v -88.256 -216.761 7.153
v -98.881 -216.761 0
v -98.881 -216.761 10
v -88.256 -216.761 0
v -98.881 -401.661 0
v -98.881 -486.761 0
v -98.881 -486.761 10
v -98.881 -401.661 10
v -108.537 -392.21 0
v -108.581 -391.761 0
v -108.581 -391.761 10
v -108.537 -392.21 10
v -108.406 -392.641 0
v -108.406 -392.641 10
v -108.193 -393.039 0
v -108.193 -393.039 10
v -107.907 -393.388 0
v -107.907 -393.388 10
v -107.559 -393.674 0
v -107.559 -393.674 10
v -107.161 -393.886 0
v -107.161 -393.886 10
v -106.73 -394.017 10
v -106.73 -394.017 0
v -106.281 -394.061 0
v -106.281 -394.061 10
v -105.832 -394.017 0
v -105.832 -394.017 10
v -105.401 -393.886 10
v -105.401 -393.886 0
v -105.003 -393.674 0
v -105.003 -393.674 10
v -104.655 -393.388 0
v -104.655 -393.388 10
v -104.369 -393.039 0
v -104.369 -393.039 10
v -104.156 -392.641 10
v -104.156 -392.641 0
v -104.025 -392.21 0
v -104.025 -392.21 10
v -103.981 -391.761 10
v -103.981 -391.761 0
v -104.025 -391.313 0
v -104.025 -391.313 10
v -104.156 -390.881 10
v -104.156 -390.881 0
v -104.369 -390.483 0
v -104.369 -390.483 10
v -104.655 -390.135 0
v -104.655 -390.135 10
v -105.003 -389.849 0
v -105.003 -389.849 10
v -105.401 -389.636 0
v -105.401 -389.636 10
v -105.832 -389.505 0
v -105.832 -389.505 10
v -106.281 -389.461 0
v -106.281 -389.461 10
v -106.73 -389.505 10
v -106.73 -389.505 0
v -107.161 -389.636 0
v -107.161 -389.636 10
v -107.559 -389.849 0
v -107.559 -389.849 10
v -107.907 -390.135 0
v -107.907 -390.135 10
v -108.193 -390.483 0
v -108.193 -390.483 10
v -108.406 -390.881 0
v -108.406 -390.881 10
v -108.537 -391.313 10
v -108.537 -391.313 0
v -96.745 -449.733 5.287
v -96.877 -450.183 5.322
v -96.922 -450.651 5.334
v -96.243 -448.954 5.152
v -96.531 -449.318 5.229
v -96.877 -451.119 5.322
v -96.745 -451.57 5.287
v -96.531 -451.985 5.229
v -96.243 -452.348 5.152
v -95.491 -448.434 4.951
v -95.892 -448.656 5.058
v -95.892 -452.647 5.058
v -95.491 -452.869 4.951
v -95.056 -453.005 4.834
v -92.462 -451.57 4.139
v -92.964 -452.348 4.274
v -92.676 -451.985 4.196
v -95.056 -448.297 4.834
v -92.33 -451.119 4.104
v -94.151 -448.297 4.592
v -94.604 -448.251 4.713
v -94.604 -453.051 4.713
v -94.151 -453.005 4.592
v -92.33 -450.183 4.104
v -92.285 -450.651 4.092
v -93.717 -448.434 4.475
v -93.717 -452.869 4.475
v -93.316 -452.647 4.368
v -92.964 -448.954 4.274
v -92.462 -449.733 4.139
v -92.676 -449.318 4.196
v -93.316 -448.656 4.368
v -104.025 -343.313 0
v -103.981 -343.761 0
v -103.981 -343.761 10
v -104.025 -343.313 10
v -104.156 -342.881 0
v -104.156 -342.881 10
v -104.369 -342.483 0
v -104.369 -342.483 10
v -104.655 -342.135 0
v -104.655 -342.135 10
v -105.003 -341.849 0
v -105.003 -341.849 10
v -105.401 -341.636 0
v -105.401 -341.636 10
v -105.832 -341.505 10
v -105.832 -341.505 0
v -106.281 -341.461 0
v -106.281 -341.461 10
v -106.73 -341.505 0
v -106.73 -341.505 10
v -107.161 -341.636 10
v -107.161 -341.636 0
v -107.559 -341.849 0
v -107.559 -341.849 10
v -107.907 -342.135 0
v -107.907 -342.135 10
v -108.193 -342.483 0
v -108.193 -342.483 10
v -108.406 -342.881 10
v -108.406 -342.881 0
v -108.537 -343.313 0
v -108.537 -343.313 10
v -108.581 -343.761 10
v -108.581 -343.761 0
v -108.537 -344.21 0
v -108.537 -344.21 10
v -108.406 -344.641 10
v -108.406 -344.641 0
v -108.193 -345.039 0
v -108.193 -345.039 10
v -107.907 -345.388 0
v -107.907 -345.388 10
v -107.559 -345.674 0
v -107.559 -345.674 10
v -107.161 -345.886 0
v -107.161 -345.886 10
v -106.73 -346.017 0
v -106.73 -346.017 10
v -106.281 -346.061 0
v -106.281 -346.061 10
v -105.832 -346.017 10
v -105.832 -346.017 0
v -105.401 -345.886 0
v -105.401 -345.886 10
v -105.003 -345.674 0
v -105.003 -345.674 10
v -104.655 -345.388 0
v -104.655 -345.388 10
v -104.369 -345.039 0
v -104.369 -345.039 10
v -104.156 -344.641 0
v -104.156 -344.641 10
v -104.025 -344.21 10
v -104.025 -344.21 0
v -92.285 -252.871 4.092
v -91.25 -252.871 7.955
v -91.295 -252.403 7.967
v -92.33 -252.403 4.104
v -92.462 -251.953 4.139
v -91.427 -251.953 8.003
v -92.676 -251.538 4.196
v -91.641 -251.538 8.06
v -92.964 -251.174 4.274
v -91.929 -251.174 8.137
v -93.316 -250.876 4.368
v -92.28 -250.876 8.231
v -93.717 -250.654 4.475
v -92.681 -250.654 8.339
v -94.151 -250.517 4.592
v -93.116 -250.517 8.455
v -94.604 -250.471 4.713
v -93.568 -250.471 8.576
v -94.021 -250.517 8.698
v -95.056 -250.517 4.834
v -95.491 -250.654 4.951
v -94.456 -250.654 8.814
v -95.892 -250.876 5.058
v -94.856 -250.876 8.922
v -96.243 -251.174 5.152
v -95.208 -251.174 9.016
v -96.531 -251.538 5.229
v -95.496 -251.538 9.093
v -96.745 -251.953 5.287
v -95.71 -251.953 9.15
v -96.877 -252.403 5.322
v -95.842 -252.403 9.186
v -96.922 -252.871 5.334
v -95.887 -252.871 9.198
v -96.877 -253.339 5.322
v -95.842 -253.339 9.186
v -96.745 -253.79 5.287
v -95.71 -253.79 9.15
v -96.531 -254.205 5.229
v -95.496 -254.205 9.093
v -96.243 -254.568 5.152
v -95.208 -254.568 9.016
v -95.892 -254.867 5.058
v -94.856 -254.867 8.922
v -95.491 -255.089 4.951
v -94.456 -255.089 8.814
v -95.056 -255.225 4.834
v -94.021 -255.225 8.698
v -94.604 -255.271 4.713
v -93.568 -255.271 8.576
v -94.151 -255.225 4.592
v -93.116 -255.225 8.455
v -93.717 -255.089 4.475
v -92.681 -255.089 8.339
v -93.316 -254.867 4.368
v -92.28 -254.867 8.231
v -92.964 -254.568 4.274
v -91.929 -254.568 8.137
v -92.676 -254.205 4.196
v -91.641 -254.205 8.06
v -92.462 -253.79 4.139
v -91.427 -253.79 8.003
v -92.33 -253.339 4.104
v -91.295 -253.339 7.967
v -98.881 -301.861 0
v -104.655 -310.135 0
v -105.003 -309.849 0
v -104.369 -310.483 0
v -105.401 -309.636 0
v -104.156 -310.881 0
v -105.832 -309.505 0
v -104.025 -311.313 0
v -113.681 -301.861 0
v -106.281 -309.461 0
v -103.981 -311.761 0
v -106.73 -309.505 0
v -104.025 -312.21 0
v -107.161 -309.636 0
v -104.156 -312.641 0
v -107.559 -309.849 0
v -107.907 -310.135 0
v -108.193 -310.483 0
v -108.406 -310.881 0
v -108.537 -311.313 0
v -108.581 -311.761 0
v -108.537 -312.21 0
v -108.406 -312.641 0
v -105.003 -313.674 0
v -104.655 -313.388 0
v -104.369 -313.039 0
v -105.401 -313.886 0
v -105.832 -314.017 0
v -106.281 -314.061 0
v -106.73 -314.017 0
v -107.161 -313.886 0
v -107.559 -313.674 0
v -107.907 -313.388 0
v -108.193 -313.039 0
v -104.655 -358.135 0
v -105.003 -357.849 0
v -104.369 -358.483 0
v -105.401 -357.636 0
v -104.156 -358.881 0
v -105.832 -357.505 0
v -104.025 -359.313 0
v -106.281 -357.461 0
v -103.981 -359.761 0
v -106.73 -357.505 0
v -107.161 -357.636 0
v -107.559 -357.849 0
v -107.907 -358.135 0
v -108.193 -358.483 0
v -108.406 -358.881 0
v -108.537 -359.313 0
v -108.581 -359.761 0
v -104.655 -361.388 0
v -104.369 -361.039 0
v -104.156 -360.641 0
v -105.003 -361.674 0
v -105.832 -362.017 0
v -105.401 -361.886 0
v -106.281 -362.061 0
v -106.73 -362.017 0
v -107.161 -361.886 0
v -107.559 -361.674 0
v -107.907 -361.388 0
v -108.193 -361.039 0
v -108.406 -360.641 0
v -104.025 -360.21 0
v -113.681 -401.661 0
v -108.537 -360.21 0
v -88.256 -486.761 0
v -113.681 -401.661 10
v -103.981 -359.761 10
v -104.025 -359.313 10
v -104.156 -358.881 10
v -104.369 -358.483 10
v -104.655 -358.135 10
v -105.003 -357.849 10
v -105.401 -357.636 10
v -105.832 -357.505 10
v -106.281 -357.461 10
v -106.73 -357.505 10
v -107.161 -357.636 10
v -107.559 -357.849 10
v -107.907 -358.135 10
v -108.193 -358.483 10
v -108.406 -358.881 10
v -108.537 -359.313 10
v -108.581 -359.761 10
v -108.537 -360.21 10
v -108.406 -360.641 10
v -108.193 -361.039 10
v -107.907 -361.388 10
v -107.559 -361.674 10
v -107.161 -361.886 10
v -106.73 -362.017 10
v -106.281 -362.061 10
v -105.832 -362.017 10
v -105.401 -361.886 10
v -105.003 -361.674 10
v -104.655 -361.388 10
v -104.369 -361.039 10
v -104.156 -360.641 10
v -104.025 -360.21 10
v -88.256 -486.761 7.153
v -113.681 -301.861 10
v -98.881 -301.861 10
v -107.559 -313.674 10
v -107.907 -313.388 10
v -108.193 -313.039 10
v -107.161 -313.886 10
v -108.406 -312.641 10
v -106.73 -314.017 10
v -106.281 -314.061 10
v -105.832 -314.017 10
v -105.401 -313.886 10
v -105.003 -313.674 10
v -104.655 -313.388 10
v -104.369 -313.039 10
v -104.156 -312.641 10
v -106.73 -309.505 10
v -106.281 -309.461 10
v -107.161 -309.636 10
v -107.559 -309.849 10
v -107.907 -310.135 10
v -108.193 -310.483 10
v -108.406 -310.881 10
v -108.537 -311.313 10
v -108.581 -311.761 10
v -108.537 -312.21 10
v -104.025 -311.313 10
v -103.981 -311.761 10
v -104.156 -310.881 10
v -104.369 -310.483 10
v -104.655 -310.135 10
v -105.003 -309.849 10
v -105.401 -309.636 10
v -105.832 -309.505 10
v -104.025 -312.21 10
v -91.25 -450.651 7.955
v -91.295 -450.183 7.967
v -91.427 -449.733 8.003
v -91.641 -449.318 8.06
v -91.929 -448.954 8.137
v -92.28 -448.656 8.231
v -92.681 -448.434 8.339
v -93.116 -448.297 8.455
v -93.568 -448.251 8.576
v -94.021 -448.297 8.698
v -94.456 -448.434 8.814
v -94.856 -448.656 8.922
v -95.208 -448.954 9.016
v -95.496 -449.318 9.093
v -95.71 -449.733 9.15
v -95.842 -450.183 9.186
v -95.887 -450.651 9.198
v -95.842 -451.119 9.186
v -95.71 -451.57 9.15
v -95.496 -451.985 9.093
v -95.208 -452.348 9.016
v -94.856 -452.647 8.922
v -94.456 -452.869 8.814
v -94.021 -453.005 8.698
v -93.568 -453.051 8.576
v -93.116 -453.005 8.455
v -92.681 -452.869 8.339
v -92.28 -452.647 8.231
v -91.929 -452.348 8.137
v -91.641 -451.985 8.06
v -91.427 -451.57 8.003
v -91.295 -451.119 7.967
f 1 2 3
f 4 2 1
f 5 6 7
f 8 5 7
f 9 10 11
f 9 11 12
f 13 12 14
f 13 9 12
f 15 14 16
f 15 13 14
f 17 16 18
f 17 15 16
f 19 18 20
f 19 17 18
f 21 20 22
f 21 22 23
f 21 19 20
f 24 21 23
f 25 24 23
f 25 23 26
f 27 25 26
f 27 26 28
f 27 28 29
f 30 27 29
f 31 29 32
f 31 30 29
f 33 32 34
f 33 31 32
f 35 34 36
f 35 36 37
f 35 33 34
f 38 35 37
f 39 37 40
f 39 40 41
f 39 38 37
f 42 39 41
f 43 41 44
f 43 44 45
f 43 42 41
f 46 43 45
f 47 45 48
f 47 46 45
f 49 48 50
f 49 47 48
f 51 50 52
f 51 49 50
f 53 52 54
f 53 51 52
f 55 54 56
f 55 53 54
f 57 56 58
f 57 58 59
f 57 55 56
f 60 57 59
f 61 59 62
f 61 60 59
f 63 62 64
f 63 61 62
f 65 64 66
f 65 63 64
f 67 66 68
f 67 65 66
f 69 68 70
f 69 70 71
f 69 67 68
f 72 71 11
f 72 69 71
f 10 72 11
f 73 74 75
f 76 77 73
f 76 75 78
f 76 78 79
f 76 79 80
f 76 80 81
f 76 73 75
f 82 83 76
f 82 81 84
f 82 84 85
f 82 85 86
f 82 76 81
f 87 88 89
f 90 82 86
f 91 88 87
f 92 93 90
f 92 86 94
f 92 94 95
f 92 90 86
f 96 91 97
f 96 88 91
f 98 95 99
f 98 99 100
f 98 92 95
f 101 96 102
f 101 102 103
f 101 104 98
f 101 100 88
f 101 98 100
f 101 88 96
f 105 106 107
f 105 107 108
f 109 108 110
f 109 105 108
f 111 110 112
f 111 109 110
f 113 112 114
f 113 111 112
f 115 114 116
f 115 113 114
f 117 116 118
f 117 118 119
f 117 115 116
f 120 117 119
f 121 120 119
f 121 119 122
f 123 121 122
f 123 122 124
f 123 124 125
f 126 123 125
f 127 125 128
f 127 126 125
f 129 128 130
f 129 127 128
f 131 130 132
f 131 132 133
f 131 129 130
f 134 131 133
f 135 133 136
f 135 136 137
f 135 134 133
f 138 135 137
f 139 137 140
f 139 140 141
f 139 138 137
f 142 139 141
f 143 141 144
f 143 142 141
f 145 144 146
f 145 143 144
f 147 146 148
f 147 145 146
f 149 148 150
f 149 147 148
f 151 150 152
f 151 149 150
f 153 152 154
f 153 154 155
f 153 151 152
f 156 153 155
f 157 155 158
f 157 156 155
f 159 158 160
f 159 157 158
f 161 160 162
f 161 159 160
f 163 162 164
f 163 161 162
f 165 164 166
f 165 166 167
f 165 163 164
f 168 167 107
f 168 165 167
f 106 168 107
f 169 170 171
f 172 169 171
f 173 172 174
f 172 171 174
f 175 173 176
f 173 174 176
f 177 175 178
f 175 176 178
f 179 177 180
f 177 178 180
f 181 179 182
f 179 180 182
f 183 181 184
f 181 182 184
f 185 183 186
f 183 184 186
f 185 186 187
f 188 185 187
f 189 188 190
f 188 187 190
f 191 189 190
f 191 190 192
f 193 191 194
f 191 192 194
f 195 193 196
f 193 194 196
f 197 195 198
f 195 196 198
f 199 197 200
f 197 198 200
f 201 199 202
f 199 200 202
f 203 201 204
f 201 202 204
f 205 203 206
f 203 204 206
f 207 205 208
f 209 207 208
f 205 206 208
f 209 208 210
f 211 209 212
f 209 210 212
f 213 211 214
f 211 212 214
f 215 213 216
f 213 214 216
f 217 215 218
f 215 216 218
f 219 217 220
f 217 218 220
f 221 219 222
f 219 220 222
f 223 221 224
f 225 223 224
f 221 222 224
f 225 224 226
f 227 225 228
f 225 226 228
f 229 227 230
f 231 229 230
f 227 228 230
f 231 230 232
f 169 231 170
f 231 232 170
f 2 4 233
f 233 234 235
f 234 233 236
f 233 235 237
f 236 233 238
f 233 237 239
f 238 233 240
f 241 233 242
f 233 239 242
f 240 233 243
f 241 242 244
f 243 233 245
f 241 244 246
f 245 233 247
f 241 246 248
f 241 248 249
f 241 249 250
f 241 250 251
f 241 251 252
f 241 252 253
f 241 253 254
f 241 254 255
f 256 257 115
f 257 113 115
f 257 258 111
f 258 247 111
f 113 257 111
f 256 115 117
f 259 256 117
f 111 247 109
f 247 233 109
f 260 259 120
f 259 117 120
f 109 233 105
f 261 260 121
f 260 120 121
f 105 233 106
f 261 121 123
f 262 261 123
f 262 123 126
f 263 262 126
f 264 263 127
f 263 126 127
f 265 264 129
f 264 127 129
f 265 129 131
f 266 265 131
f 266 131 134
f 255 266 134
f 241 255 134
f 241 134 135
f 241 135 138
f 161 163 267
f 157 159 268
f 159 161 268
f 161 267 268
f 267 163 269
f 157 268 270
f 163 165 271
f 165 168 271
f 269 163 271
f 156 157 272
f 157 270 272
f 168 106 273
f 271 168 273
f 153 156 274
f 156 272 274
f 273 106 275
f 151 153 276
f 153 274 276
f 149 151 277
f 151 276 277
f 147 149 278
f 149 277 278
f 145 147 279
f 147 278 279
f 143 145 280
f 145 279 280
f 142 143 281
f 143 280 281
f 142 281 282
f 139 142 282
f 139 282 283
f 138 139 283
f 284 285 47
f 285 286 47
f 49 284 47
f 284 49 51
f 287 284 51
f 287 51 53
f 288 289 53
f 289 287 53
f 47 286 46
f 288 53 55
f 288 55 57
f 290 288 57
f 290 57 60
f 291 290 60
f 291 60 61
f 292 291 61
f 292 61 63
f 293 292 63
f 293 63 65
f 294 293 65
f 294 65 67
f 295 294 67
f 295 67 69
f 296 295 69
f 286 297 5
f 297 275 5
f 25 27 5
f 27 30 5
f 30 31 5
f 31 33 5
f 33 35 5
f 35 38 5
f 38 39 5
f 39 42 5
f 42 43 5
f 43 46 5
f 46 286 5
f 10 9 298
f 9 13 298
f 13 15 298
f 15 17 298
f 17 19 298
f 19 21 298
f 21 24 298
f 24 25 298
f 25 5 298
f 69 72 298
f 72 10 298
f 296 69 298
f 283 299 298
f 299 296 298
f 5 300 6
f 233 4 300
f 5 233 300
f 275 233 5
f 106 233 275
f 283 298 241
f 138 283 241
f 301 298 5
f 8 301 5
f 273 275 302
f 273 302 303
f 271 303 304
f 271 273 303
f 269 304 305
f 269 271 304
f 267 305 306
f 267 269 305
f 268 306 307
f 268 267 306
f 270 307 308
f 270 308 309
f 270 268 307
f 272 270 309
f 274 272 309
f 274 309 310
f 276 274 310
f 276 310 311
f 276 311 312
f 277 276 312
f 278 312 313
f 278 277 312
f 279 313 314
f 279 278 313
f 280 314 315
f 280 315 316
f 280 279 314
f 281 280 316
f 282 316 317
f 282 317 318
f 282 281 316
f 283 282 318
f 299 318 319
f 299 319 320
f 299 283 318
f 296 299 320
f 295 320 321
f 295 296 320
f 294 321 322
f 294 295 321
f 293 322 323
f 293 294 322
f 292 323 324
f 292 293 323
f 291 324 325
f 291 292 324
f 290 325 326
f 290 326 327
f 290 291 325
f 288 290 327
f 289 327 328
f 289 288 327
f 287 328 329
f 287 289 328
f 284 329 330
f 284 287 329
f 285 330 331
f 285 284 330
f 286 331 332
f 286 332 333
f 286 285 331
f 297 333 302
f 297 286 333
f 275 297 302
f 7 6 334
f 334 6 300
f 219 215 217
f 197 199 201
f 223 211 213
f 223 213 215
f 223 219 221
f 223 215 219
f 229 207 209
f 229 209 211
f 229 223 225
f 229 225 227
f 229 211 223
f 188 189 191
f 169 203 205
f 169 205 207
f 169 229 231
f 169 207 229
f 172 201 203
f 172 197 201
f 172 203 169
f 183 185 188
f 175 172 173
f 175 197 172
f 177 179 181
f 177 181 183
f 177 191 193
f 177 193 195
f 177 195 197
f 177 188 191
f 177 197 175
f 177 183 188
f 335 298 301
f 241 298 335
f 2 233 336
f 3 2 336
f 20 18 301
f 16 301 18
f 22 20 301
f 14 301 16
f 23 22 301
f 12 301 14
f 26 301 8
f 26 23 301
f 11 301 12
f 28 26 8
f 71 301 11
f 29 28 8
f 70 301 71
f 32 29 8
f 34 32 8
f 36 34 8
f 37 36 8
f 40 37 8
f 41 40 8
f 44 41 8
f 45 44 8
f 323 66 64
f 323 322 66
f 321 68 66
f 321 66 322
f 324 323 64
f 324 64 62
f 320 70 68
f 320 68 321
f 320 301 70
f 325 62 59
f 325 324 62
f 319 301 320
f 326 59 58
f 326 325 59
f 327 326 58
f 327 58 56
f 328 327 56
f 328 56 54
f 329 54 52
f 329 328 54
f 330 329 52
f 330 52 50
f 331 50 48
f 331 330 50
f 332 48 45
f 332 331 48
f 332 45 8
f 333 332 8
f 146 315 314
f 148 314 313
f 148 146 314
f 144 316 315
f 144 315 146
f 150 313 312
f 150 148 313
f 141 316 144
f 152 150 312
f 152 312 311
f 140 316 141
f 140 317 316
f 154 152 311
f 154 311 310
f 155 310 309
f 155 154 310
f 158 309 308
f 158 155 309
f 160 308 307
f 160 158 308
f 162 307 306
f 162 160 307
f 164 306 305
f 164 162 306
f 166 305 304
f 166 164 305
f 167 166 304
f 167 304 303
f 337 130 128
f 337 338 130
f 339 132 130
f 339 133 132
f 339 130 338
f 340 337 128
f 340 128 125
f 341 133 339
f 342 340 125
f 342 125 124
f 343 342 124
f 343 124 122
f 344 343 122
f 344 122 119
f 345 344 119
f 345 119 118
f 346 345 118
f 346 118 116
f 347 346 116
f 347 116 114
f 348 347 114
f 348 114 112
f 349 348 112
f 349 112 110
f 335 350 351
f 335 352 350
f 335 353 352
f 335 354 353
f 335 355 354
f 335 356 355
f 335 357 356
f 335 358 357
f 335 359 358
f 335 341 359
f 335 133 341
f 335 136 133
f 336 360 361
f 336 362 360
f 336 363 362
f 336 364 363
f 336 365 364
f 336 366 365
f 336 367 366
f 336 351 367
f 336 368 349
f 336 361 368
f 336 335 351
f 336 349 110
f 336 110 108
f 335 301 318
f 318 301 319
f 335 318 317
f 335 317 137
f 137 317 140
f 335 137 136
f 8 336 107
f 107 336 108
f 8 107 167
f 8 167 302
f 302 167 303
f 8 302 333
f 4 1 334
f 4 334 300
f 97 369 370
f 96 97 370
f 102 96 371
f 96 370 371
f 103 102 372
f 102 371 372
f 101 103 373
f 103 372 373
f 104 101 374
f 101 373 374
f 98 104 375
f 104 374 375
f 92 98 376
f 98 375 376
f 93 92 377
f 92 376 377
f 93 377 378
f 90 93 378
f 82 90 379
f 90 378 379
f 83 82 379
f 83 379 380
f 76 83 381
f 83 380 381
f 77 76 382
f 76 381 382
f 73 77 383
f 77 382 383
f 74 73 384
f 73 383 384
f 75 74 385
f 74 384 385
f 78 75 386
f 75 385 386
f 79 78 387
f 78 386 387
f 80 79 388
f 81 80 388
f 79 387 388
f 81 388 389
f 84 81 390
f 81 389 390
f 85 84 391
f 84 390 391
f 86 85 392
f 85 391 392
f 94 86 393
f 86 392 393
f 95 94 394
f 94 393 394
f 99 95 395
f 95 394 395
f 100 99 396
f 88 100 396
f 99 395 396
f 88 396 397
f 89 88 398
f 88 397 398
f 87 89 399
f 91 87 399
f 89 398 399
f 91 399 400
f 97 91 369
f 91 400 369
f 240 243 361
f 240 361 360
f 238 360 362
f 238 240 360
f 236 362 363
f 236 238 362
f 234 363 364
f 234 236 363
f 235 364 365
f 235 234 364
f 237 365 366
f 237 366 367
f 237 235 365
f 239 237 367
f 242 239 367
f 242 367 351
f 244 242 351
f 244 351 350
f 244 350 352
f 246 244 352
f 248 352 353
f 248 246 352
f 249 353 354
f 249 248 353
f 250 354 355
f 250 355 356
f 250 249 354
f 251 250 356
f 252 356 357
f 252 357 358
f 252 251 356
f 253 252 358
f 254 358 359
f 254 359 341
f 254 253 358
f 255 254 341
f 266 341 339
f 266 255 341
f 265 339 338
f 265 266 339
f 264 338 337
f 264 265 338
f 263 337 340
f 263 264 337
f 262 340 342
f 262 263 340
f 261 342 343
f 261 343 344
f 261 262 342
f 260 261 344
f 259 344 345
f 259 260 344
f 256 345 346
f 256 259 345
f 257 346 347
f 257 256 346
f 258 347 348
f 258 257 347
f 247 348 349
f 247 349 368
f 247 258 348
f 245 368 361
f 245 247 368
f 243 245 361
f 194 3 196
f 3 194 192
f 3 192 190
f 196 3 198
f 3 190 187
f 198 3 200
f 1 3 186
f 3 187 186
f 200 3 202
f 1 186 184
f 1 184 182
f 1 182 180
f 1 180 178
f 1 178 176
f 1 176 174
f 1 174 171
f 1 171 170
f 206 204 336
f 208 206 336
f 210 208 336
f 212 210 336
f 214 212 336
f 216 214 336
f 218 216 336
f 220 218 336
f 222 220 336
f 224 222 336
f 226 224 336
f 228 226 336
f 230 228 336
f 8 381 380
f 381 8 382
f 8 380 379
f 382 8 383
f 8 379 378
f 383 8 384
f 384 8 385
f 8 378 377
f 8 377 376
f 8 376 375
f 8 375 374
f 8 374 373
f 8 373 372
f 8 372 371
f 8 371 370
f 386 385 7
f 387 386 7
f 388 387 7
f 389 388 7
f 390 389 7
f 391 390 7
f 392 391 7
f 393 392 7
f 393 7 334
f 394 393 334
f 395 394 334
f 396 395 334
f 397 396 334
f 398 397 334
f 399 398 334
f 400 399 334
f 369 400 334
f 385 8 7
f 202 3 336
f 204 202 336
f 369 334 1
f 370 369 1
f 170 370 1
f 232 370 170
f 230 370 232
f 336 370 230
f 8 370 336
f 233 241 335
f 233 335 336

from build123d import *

# Parameters (mm, degrees)
SKETCH2_W           = 14.8
SKETCH2_H           = 99.8
BOSS_EXTRUDE1_DEPTH = 10
BOSS_EXTRUDE2_START = -486.761258468
BOSS_EXTRUDE2_DEPTH = 270
SKETCH5_R           = 2.4
CUT_EXTRUDE1_DEPTH  = 4


# Read off the part's stored shape, not the designer's step: Boss-Extrude2
with BuildPart() as part:
    # Sketch2 → Boss-Extrude1 (new body)
    with BuildSketch(Plane.XY):
        with Locations((-106.280981946, -351.761258468)):
            Rectangle(SKETCH2_W, SKETCH2_H)
        with BuildLine():
            ThreePointArc((-103.980981946, -391.761258468), (-106.280981946, -389.461258468), (-108.580981946, -391.761258468))
            ThreePointArc((-108.580981946, -391.761258468), (-106.280981946, -394.061258468), (-103.980981946, -391.761258468))
        make_face(mode=Mode.SUBTRACT)
        with BuildLine():
            ThreePointArc((-108.580981946, -359.761258468), (-106.280981946, -362.061258468), (-103.980981946, -359.761258468))
            ThreePointArc((-103.980981946, -359.761258468), (-106.280981946, -357.461258468), (-108.580981946, -359.761258468))
        make_face(mode=Mode.SUBTRACT)
        with BuildLine():
            ThreePointArc((-108.580981946, -343.761258468), (-106.280981946, -346.061258468), (-103.980981946, -343.761258468))
            ThreePointArc((-103.980981946, -343.761258468), (-106.280981946, -341.461258468), (-108.580981946, -343.761258468))
        make_face(mode=Mode.SUBTRACT)
        with BuildLine():
            ThreePointArc((-108.580981946, -311.761258468), (-106.280981946, -314.061258468), (-103.980981946, -311.761258468))
            ThreePointArc((-103.980981946, -311.761258468), (-106.280981946, -309.461258468), (-108.580981946, -311.761258468))
        make_face(mode=Mode.SUBTRACT)
    extrude(amount=BOSS_EXTRUDE1_DEPTH)

    # Boss-Extrude2 outline → Boss-Extrude2 (add)
    with BuildSketch(Plane(origin=(0, 0, 0), x_dir=(1, 0, 0), z_dir=(0, 1, 0)).offset(BOSS_EXTRUDE2_START)):
        Polygon((-88.255797857, -7.152990504), (-88.255797857, 0), (-98.880981946, 0), (-98.880981946, -10), align=None)
    extrude(amount=BOSS_EXTRUDE2_DEPTH)

    # Sketch5 → Cut-Extrude1 (cut)
    with BuildSketch(Plane(origin=(-4.123769815, 0, -15.390118468), x_dir=(0.9659258262890692, 0, -0.25881904510251785), z_dir=(0.25881904510251785, 0, 0.9659258262890692))):
        with Locations((-92.599884641, -252.871258468)):
            Circle(SKETCH5_R)
        with Locations((-92.599884641, -450.651258468)):
            Circle(SKETCH5_R)
    extrude(amount=-CUT_EXTRUDE1_DEPTH, mode=Mode.SUBTRACT)


solid = part.part
